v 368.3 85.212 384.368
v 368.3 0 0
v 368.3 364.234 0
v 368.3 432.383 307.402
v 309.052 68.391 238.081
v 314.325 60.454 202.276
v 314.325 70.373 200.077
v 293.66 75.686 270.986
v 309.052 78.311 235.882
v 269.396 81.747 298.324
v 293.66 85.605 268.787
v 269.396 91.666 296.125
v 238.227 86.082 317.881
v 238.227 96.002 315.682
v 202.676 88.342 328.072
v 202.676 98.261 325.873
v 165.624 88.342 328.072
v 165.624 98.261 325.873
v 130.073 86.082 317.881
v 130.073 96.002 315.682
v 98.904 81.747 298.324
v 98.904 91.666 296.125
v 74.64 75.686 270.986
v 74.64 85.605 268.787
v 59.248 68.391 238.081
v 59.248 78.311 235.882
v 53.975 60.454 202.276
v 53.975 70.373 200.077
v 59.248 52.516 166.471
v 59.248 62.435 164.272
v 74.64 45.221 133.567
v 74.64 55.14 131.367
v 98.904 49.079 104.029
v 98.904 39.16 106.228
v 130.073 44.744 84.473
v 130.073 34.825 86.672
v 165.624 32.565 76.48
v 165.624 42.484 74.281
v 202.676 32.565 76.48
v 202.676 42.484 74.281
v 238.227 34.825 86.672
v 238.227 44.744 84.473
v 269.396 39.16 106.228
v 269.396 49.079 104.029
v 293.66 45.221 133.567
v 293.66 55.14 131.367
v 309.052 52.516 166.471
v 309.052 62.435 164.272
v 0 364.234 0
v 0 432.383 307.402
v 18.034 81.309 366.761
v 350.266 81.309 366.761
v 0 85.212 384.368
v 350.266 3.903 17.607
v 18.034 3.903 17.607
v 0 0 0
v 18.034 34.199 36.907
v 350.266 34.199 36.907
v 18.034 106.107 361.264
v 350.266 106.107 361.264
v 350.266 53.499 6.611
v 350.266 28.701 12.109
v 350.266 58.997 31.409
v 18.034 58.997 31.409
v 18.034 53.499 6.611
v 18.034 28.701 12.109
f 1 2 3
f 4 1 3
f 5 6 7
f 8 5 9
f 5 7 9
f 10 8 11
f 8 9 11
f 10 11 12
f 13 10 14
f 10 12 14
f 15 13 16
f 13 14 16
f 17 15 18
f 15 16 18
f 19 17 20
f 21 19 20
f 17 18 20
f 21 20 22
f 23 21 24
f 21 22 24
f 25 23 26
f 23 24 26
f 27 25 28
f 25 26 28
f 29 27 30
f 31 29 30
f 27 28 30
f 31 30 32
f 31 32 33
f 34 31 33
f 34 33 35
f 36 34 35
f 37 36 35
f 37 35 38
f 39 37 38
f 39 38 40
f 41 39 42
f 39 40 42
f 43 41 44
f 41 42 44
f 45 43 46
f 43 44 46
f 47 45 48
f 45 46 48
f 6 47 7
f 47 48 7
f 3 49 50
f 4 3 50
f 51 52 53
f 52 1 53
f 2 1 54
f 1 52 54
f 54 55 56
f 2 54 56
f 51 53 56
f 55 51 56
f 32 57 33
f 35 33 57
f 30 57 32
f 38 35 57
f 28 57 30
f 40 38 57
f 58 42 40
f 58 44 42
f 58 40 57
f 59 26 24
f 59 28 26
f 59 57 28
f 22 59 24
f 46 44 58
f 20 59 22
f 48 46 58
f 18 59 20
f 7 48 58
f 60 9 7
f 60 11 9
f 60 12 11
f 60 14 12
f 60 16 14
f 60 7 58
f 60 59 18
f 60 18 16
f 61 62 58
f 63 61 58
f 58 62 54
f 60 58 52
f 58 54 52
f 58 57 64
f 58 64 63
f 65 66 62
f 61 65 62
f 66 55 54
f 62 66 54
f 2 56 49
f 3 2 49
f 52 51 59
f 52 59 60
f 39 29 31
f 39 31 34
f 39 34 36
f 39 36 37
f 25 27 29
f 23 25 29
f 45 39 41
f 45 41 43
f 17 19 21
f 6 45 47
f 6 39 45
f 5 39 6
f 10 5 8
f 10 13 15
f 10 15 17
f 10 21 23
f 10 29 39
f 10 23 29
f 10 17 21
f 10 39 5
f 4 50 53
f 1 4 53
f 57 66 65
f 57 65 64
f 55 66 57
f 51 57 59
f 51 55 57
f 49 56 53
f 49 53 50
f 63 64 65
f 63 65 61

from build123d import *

# Parameters (mm, degrees)
F1_DEPTH = 368.3
F2_W     = 332.232
F2_H     = 357.632
F3_DEPTH = 25.4
F4_R     = 130.175
F5_DEPTH = 10.16
F6_W     = 332.232
F6_H     = 25.4
F7_DEPTH = 25.4


with BuildPart() as f1:
    # F0 (on Right) → F1 (new body)
    with BuildSketch(Plane.YZ):
        Polygon((85.2122760074, 384.3677380031), (0, 0), (364.2337952902, 0), (432.3831361393, 307.4018112867), align=None)
    extrude(amount=F1_DEPTH)

    # F2 (on face) → F3 (cut)
    with BuildSketch(Plane(origin=(0, 0, 0), x_dir=(1, 0, 0), z_dir=(0, -0.9762960071, 0.2164396139))):
        with Locations((184.15, 196.85)):
            Rectangle(F2_W, F2_H)
    extrude(amount=-F3_DEPTH, mode=Mode.SUBTRACT)

    # F4 (on face) → F5 (join)
    with BuildSketch(Plane(origin=(0, 24.7979185808, -5.497566194), x_dir=(1, 0, 0), z_dir=(0, -0.9762960071, 0.2164396139))):
        with Locations((184.15, 210.566)):
            Circle(F4_R)
    extrude(amount=F5_DEPTH)

    # F6 (on face) → F7 (cut)
    with BuildSketch(Plane(origin=(0, 24.7979185808, -5.497566194), x_dir=(1, 0, 0), z_dir=(0, -0.9762960071, 0.2164396139))):
        with Locations((184.15, 30.734)):
            Rectangle(F6_W, F6_H)
    extrude(amount=-F7_DEPTH, mode=Mode.SUBTRACT)


solid = f1.part
